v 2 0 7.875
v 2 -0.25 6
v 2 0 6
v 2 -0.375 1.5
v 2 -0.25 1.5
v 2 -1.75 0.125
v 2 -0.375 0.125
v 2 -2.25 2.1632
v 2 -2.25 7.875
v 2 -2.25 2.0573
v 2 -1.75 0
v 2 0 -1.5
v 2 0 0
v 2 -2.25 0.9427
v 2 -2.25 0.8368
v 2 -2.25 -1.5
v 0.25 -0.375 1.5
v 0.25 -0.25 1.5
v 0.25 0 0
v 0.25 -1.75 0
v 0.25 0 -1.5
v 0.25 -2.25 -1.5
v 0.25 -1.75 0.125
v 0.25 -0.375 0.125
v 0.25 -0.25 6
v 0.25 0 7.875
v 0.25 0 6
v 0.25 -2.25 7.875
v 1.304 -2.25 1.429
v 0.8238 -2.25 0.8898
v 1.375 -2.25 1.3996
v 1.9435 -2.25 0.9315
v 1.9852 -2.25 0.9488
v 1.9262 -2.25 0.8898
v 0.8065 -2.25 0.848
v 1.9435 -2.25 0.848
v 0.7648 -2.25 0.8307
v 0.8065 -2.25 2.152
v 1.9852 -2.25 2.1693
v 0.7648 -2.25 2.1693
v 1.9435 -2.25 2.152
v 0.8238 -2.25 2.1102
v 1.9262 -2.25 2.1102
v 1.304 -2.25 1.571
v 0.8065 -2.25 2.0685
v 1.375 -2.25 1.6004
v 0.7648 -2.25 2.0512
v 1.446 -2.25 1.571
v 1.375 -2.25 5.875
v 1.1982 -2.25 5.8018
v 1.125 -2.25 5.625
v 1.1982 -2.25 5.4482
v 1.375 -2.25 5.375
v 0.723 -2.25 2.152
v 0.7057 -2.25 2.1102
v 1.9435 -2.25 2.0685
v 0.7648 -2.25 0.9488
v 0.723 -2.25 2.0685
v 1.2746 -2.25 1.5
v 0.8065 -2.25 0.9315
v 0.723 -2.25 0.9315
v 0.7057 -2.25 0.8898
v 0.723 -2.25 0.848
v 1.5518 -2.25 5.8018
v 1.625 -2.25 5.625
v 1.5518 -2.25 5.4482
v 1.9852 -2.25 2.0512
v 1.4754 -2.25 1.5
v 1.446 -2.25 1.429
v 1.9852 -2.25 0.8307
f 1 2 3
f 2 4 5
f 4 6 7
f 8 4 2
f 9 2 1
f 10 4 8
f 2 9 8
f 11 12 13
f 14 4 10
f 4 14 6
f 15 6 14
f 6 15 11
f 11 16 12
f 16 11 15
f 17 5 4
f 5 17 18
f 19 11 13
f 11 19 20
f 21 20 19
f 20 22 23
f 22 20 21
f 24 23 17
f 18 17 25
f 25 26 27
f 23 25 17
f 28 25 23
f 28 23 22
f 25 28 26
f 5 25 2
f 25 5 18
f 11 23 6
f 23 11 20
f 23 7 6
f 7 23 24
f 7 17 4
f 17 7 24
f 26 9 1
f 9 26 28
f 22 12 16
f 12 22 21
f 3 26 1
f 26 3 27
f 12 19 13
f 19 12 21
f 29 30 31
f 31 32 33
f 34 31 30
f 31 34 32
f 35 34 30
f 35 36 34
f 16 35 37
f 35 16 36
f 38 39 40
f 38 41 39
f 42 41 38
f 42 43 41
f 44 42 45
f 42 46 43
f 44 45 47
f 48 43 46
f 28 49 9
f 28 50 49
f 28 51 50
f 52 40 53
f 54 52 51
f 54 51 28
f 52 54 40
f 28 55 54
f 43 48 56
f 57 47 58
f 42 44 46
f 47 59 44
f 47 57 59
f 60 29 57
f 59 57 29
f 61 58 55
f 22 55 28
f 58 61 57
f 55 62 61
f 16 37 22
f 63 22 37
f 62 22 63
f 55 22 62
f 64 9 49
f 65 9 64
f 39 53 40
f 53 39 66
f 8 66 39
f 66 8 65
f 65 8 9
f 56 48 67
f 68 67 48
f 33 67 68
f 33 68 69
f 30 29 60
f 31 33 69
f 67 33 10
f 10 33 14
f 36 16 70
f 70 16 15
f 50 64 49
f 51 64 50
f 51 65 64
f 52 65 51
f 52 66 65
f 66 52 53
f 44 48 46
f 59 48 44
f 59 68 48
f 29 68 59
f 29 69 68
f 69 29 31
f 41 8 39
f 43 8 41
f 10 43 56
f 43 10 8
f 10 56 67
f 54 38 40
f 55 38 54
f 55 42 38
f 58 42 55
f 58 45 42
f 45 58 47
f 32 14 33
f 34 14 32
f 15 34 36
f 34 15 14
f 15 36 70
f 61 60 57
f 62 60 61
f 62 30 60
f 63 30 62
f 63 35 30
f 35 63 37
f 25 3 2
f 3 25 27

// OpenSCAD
// file: TTvars.scad
$fn=8; //default 36

barX=0.25;
barZ=6;
barLY=108;
barLX=60;

angX=1.5;
angT=0.125;
angLY=barLY;
angLX=barLX;
angR=0.25;

cornerSQ=1.5; //size of square tubing in corners
cornerSQr=0.125; //radius of square tubing 90s
cornerT=0.5; //thickness of corner mount walls
cornerBoltOD=0.5;

boltD=0.5;   // 6mm
boltL=1.968504;    // 50mm

brrOD=0.875;
brrID=0.375;
brrT=0.28125;

sprOD=0.25;

bmountGap=0.125;
bmountbrrGap=0.125;

stepBoltD=0.11811024;  //3.0mm bolt diameter
stepBoltHD=0.22362205; //5.68mm head diameter
stepBoltHH=0.11811024;  //3.0mm head height
stepBoltX=1.22047244;   //31.0mm square from bolt center to center
stepBoltIn=0.15748031;  //4.0mm bolt depth into stepper
stepSeatD=0.86614173;    //22.0mm
stepSeatH=0.07874016;    //2.0mm
stepX=1.66535433;        //42.3mm stepper square face 
stepBoreD=0.2007874;     //5.1mm shaft bore
stepBoreL=0.94488189;    //24mm

pullP=1.253;       //OD of belt around pully GT2 20T ??
pullH=0;            //Height of pulley


//calculated

Y2Y=barLX+0.0;
Y2YA=Y2Y+(((((barX+(bmountGap*2)))/2)+0.5)*2); //center to center barL
X2X=8; //distance between X rails

bmountX=barX+((brrOD+1)*2);
bmountY=X2X;
bmountZ=barZ+(1+boltD)+(brrOD/2)+(brrID/2)+(0.25)+boltD+(0.5);

xmountX=((bmountX-(barX+(bmountGap*2)))/2)+0;
xmountY=angX+barX+1.0;
// main file
include <TTvars.scad>;

TTxmount();

//need to add stepper motor mounting holes or idler


module TTxmount(){
translate([(barX+(bmountGap*2))/2,-(angX+0.75),-(1+boltD)]){    
difference(){
cube([((bmountX-(barX+(bmountGap*2)))/2),angX+0.75,bmountZ]);    
//main flat bar cutout
    translate([0,(angX+0.75)-barX,(1+boltD)])
cube([((bmountX-(barX+(bmountGap*2)))/2),barX,barZ]);

//angle iron
translate([0,0.75-barX,(1+boltD)])
difference(){
    cube([((bmountX-(barX+(bmountGap*2)))/2),angX,angX]);
    translate([0,-angT,angT])
    cube([((bmountX-(barX+(bmountGap*2)))/2),angX,angX]);
}
translate([(((barX+(bmountGap*2)))/2)+0.5,-barX-angX,0])
translate([0,angX-angR-angT,angT])
difference(){
cube([((bmountX-(barX+(bmountGap*2)))/2)-0.5,angR,angR]);
    translate([0,0,angR])
    rotate([0,90,0])
    cylinder(r=angR,h=((bmountX-(barX+(bmountGap*2)))/2)-0.5,$fn=36);

} //end difference    

translate([bmountX-(((bmountX-(barX+(bmountGap*2)))/2)/2)-(bmountX/2),-(angX+0.75),-(1+boltD)/2])
rotate([-90,0,0])
    cylinder(d=boltD, h=(angX+0.75));
translate([bmountX-(((bmountX-(barX+(bmountGap*2)))/2)/2)-(bmountX/2),-(angX+0.75),barZ+(brrOD/2)+(brrID/2)+(0.25)+(boltD/2)])
rotate([-90,0,0])
    cylinder(d=boltD, h=(angX+0.75));
    
//stepper

//bore
translate([bmountX-(((bmountX-(barX+(bmountGap*2)))/2)/2)-(bmountX/2),-(angX+0.75),barZ/2])
rotate([270,0,0])
cylinder(d=stepBoreD,h=angX+0.75);

//translate([bmountX-(((bmountX-(barX+(bmountGap*2)))/2)/2)-(bmountX/2),-(angX+0.75),barZ/2])
//rotate([270,0,0])
//cylinder(d=pullP,h=angX+0.75);

translate([bmountX-(((bmountX-(barX+(bmountGap*2)))/2)/2)-(bmountX/2),-(angX+0.75),barZ/2])
rotate([270,0,0])
cylinder(d=stepSeatD,h=stepSeatH);

translate([bmountX-(((bmountX-(barX+(bmountGap*2)))/2)/2)-(bmountX/2)+(stepBoltX/2),-(angX+0.75),(barZ/2)+(stepBoltX/2)])
rotate([270,0,0])
cylinder(d=stepBoltD,h=angX+0.75);
translate([bmountX-(((bmountX-(barX+(bmountGap*2)))/2)/2)-(bmountX/2)-(stepBoltX/2),-(angX+0.75),(barZ/2)+(stepBoltX/2)])
rotate([270,0,0])
cylinder(d=stepBoltD,h=angX+0.75);
translate([bmountX-(((bmountX-(barX+(bmountGap*2)))/2)/2)-(bmountX/2)+(stepBoltX/2),-(angX+0.75),(barZ/2)-(stepBoltX/2)])
rotate([270,0,0])
cylinder(d=stepBoltD,h=angX+0.75);
translate([bmountX-(((bmountX-(barX+(bmountGap*2)))/2)/2)-(bmountX/2)-(stepBoltX/2),-(angX+0.75),(barZ/2)-(stepBoltX/2)])
rotate([270,0,0])
cylinder(d=stepBoltD,h=angX+0.75);


} //end difference
} //end translate
} //end TTxmount
